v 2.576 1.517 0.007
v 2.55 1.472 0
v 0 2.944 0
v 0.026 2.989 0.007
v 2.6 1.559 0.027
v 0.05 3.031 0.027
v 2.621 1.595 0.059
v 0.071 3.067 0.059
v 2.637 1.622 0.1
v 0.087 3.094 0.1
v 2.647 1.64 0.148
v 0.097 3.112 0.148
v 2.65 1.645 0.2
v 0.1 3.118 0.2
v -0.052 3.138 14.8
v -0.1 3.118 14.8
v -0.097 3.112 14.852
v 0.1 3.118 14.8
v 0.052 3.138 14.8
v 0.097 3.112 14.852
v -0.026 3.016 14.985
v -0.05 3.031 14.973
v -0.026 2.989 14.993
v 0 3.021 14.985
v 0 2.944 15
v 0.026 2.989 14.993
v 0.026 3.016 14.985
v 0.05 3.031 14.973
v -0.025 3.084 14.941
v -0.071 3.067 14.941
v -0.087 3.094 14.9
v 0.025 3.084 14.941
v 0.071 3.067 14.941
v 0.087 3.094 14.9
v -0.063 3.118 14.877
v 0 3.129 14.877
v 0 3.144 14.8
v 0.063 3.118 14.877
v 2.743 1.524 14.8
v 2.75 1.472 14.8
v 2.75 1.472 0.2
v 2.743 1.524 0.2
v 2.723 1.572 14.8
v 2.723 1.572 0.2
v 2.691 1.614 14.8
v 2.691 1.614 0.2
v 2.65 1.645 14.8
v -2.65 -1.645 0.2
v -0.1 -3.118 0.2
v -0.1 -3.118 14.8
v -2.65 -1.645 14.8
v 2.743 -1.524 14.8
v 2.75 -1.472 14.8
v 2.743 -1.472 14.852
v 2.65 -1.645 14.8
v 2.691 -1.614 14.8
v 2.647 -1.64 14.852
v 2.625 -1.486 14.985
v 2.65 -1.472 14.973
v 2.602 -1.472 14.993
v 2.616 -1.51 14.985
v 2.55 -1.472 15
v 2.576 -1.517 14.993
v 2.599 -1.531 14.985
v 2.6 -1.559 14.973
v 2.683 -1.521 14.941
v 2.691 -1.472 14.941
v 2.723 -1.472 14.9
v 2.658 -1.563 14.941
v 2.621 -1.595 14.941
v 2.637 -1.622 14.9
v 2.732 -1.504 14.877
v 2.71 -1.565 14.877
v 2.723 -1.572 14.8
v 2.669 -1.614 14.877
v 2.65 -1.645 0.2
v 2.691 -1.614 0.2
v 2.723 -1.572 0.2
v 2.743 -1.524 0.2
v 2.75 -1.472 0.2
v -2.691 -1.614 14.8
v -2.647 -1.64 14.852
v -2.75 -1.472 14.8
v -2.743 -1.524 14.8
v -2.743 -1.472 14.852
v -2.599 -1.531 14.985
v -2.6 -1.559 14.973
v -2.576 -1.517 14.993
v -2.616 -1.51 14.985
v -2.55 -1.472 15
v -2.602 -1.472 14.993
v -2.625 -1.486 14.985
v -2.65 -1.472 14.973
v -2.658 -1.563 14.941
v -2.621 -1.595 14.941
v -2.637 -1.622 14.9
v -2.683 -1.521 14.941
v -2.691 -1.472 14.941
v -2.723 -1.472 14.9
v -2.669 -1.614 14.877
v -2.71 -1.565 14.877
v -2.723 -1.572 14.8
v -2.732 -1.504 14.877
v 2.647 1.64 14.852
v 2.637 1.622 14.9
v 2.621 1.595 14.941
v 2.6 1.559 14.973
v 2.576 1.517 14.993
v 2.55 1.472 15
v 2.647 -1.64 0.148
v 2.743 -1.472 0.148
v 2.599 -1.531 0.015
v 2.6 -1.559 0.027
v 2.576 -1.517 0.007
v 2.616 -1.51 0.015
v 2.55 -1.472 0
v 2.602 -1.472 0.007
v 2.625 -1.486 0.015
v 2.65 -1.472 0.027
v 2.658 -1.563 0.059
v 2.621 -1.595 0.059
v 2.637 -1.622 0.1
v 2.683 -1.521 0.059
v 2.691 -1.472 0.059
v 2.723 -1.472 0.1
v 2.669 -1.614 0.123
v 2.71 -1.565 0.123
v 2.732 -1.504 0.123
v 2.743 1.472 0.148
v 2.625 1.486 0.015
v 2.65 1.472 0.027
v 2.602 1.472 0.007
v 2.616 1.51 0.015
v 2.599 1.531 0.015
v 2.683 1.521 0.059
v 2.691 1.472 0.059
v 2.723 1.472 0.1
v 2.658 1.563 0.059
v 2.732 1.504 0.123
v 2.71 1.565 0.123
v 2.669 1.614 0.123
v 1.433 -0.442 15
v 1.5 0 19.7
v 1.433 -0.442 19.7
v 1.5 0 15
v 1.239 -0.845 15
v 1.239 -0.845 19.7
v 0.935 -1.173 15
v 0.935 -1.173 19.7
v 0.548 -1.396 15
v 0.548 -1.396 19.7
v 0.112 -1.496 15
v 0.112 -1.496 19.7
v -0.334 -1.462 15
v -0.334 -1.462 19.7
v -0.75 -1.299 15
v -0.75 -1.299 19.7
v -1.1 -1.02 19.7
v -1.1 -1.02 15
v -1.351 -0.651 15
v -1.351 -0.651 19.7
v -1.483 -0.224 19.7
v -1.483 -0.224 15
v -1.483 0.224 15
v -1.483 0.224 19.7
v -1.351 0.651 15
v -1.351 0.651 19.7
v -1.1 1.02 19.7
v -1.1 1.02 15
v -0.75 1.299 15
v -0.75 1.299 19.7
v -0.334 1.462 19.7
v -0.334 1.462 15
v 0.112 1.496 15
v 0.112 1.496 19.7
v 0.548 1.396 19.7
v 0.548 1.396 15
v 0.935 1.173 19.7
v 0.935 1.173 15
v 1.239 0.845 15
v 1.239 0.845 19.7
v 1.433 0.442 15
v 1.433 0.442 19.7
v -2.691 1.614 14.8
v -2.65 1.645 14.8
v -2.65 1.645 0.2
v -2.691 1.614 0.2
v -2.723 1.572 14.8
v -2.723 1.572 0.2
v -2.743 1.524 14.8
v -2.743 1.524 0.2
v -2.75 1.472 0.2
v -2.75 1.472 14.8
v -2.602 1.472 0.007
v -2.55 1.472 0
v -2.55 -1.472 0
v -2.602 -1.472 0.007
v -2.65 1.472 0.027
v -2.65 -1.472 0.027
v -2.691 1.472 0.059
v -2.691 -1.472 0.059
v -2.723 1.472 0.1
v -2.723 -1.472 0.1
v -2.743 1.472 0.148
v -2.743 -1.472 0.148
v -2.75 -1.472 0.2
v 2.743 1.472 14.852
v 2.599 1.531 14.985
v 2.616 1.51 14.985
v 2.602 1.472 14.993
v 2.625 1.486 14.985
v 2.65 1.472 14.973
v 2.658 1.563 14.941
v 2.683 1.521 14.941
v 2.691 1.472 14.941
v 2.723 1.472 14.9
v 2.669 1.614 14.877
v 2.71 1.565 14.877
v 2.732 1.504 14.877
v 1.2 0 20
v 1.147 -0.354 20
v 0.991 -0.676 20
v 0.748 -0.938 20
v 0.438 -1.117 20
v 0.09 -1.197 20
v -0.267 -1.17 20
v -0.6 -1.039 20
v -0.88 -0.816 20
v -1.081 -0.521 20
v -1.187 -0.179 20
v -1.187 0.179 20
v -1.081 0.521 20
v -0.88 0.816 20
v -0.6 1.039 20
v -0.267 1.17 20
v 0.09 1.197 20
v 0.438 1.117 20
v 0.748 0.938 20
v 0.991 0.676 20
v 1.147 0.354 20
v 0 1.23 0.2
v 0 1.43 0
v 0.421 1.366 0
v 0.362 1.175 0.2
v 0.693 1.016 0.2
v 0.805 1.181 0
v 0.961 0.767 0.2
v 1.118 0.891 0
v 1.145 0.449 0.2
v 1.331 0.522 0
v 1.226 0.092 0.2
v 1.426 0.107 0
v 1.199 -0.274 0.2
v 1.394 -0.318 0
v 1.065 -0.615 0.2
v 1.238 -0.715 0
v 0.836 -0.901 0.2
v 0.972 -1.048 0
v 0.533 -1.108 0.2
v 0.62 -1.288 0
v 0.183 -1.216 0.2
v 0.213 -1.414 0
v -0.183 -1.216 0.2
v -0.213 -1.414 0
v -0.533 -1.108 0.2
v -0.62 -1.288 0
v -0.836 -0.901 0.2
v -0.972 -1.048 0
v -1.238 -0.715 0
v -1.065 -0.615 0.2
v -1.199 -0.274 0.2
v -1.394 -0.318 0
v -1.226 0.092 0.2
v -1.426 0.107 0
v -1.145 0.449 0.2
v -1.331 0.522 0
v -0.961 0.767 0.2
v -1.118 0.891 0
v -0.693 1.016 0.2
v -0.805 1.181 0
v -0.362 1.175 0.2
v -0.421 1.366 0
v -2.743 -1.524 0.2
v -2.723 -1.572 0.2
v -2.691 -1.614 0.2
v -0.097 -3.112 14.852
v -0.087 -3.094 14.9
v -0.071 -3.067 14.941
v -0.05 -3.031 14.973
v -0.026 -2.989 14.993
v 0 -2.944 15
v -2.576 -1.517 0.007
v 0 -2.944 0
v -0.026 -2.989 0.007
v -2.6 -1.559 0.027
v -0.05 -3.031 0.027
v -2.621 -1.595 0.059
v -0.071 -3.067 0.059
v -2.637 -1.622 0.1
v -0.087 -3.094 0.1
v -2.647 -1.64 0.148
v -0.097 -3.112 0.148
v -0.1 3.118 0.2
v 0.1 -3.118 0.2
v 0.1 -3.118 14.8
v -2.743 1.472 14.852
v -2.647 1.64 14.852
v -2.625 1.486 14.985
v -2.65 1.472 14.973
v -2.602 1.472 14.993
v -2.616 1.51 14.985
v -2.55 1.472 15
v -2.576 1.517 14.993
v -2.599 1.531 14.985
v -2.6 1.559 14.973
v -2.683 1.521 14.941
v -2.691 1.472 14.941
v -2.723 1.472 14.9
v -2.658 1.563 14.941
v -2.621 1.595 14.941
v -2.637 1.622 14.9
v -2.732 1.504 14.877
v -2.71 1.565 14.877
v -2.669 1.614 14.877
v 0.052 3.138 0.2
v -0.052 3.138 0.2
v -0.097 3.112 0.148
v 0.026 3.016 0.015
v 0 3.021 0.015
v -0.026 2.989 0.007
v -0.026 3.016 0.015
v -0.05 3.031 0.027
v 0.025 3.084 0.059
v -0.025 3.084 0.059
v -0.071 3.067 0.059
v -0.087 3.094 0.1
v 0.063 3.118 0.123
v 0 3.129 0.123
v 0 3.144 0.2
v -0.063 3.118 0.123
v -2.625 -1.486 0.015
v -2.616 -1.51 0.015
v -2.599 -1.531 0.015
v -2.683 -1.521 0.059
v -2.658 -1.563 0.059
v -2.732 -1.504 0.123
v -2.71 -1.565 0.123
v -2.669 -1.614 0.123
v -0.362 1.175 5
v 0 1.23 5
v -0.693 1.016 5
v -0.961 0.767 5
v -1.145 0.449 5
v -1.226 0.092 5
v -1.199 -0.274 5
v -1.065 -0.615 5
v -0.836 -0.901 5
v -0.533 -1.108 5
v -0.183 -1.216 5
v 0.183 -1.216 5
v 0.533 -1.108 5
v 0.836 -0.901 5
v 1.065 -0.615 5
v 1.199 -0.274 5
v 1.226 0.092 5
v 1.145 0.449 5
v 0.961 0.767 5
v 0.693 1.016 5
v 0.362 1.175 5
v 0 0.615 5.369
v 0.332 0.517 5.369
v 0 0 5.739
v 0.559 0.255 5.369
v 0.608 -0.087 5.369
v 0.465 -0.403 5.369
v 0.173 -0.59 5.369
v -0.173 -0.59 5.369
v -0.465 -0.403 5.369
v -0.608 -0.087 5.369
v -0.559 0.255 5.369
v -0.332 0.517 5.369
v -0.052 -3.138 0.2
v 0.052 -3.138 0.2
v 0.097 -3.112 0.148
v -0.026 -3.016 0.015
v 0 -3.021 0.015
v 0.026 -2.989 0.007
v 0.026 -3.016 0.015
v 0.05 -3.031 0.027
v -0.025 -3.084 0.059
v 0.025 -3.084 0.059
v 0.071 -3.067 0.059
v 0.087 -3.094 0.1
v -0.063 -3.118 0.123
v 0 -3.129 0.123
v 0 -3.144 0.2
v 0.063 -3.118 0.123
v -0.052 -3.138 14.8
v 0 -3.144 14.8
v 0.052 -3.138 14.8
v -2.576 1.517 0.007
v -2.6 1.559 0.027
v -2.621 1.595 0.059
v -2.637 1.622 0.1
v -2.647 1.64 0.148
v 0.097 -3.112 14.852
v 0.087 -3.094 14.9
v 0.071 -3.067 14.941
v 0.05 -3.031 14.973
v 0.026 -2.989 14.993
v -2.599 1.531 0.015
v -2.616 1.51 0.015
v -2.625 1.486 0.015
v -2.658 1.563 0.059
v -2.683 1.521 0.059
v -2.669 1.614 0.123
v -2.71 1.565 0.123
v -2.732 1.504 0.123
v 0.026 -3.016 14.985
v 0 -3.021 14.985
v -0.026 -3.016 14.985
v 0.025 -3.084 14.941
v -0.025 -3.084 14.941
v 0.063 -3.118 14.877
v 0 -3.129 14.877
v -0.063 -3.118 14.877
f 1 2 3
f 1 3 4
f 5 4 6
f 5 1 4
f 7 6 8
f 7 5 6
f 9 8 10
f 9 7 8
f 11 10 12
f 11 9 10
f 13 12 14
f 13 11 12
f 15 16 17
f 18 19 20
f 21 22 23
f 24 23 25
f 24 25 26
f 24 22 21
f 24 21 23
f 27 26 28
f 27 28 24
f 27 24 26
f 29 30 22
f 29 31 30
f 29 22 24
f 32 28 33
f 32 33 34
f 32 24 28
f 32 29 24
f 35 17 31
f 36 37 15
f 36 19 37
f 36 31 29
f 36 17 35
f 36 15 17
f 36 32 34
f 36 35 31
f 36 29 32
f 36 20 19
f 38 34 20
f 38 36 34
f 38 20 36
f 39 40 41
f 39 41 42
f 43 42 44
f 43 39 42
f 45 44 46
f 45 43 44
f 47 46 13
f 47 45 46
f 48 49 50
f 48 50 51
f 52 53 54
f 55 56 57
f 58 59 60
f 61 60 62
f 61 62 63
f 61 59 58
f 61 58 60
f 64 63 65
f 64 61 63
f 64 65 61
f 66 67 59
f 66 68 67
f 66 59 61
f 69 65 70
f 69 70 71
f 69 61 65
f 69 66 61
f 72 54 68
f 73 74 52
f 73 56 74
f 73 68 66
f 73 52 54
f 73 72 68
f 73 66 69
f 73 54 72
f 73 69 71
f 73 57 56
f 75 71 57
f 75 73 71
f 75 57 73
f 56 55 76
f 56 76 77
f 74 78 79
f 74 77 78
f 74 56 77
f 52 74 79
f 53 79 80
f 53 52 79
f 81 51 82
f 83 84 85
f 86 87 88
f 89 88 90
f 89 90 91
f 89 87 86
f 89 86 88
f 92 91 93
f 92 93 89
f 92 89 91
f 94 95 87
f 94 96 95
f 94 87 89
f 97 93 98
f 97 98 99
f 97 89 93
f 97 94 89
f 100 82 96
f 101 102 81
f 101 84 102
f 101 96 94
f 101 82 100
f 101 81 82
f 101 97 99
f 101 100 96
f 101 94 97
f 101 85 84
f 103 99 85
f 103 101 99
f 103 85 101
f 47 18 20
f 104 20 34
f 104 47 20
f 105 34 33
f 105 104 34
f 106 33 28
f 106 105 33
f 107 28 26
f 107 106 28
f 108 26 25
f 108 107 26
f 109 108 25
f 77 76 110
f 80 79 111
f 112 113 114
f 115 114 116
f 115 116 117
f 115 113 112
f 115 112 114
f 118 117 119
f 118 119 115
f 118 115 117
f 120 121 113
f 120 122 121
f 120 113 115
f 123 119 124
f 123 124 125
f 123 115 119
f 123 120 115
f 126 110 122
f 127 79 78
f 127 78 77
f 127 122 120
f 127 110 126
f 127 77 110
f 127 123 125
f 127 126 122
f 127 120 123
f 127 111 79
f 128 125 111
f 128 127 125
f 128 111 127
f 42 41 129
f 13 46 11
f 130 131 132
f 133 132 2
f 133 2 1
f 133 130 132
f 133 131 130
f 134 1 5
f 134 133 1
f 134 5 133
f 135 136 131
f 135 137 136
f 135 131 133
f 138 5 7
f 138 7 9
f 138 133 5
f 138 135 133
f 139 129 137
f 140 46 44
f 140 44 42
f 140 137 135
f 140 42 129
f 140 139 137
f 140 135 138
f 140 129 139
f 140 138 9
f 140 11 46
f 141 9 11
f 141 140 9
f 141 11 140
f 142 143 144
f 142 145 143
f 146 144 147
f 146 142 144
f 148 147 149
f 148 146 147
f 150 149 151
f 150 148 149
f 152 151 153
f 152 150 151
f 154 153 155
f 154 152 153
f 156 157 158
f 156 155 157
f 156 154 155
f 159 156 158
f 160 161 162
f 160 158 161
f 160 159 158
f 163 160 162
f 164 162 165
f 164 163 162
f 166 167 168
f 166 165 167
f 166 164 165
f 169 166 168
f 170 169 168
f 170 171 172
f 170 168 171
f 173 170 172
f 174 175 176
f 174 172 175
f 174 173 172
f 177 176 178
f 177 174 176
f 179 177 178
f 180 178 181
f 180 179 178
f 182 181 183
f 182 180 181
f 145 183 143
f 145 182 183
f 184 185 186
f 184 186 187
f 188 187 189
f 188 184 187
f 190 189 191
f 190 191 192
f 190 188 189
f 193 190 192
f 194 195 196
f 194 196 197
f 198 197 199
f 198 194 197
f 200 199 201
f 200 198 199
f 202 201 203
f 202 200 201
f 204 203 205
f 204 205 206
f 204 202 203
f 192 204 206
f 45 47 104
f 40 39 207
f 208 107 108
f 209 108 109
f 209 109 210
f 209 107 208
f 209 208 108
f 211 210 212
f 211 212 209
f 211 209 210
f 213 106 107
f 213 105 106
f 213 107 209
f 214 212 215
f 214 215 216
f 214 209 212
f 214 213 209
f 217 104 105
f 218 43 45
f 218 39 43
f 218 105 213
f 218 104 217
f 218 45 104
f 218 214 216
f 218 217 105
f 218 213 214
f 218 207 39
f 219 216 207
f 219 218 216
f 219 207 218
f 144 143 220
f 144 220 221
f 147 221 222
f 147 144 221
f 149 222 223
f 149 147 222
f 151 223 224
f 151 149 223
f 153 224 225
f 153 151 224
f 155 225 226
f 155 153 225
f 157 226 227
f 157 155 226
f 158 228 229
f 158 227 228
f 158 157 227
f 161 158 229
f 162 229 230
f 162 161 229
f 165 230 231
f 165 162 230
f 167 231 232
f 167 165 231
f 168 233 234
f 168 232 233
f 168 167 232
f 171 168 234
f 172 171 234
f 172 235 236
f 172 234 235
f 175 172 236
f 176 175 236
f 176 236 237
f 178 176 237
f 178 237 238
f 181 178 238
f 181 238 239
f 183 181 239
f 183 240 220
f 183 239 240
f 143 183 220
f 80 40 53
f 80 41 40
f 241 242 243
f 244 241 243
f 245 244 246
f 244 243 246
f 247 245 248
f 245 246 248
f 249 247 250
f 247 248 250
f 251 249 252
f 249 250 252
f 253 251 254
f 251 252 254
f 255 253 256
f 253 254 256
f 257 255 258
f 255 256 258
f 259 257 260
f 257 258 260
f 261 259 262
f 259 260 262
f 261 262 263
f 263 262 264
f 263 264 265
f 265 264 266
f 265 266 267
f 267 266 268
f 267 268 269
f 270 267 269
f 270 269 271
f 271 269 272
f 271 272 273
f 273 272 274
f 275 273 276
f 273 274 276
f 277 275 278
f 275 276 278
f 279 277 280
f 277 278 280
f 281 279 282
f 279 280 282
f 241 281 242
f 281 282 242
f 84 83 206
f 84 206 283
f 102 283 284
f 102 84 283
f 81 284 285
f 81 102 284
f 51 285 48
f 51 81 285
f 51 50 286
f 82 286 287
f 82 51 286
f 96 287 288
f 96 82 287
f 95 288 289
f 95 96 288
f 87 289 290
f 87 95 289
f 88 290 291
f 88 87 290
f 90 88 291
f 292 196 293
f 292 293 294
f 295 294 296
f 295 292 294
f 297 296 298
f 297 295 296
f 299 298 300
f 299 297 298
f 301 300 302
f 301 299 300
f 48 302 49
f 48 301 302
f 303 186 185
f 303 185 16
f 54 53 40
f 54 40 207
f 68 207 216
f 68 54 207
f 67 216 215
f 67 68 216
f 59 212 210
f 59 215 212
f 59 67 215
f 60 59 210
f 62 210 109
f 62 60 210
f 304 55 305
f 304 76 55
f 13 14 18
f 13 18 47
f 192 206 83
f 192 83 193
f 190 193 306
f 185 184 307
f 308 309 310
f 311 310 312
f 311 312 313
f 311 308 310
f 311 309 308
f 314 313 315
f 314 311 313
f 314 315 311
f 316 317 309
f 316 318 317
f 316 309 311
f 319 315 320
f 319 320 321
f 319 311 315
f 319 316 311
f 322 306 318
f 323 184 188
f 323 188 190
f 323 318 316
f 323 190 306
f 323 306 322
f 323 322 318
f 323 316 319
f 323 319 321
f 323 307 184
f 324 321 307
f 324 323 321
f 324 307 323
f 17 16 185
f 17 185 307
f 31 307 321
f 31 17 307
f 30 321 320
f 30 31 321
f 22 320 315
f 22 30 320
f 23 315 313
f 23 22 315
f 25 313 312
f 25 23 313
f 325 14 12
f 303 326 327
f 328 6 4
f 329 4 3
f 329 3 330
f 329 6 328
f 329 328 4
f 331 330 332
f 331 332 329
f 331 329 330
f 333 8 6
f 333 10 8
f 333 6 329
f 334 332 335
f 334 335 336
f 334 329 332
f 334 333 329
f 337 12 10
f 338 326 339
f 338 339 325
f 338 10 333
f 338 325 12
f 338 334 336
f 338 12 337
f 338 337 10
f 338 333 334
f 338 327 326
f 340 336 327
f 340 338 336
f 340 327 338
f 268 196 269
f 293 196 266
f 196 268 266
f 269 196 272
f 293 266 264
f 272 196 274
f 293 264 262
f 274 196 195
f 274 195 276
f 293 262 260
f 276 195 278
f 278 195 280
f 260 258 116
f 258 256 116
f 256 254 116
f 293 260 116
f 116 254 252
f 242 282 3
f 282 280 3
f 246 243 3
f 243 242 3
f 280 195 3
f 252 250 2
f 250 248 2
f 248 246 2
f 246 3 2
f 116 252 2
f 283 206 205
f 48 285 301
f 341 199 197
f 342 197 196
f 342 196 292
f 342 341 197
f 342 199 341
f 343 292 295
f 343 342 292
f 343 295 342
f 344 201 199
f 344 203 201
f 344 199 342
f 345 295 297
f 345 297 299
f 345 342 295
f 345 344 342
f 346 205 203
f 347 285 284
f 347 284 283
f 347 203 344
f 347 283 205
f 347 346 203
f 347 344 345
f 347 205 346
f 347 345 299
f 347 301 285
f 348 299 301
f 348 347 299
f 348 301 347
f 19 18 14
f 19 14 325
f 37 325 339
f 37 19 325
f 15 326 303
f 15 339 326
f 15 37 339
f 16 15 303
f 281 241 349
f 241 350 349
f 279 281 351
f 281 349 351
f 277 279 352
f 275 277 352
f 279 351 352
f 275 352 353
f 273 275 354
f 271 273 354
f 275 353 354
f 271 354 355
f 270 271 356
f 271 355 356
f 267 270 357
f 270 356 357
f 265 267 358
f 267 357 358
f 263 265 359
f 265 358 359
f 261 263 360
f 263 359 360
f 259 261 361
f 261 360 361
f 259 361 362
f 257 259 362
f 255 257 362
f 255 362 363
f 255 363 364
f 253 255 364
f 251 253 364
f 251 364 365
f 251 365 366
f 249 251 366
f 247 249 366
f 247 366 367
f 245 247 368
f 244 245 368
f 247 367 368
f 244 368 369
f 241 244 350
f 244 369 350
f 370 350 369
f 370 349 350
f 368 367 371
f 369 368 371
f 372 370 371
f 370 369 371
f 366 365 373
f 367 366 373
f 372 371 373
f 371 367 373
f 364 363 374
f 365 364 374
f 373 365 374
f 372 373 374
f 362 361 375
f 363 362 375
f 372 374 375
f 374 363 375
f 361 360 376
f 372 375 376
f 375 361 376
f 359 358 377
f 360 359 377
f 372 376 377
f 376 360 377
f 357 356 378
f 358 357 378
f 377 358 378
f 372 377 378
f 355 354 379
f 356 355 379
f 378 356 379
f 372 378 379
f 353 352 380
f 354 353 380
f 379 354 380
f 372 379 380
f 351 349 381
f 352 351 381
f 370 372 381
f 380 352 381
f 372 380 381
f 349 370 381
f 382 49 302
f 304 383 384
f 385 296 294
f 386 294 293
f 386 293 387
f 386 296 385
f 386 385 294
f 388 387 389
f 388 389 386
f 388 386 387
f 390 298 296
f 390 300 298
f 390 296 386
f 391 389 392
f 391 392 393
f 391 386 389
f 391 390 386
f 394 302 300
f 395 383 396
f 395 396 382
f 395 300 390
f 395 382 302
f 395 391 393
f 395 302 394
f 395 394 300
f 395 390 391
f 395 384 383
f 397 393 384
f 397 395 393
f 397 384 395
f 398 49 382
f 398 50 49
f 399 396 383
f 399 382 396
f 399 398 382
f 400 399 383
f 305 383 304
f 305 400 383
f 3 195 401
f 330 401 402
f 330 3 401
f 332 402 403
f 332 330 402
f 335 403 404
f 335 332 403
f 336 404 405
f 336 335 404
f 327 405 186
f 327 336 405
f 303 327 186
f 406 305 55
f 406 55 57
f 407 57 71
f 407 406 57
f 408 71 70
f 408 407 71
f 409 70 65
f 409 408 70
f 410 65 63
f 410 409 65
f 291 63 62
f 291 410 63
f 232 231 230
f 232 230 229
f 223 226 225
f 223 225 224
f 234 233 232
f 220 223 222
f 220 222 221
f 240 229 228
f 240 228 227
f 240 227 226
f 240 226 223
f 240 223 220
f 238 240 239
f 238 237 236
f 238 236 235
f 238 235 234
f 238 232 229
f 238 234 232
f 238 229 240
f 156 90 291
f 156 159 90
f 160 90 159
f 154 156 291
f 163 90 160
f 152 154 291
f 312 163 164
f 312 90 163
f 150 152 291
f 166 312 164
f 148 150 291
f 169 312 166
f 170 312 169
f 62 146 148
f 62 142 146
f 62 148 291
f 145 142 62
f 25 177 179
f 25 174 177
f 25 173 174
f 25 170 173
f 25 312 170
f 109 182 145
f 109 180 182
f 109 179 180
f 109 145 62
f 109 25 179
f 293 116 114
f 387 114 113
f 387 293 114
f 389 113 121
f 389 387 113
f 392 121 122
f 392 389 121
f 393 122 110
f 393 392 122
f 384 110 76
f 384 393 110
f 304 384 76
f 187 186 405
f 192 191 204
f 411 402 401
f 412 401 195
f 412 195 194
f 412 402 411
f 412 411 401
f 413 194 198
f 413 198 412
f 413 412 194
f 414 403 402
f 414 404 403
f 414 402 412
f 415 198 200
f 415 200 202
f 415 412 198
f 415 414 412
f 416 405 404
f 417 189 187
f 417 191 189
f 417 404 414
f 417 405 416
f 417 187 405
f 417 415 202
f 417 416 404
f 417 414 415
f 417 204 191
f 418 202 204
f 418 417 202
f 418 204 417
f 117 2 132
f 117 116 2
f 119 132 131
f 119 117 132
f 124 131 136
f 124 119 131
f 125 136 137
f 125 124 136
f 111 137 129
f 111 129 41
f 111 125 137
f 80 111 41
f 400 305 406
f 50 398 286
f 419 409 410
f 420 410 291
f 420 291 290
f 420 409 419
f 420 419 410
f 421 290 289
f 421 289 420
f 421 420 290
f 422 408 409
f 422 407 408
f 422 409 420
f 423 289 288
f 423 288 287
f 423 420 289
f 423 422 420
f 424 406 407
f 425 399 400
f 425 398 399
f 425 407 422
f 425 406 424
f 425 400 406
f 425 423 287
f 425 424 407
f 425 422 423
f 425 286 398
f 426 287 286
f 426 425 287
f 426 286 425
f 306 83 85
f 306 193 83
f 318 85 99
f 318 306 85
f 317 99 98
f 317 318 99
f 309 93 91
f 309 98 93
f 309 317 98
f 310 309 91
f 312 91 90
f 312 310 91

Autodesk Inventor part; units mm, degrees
ref_plane "YZ Plane" through (0, 0, 0) normal (1, 0, 0) x (0, 1, 0)
ref_plane "XZ Plane" through (0, 0, 0) normal (0, 1, 0) x (-1, 0, 0)
ref_plane "XY Plane" through (0, 0, 0) normal (0, 0, 1) x (1, 0, 0)
sketch "スケッチ1" plane through (0, 0, 0) normal (0, 0, 1) x (1, 0, 0)
  line L0 (0, 3.1754) -> (2.75, 1.5877)
  line L1 (2.75, 1.5877) -> (2.75, -1.5877)
  line L2 (2.75, -1.5877) -> (0, -3.1754)
  line L3 (0, -3.1754) -> (-2.75, -1.5877)
  line L4 (-2.75, -1.5877) -> (-2.75, 1.5877)
  line L5 (-2.75, 1.5877) -> (0, 3.1754)
  point P0 (0, 0)
  point P1 (0, 0)
  dimension "d0" = 5.5
extrude "押し出し1" add sketch "スケッチ1" along normal blind 15
sketch "スケッチ2" plane through (0, 0, 15) normal (0, 0, 1) x (1, 0, 0)
  circle A0 centre (0, 0) radius 1.5
  dimension "d3" = 3
extrude "押し出し2" add sketch "スケッチ2" along normal blind 5
thread "ねじ1" size "M3x0.5" class "6g" standard "ANSI Metric M Profile" length 12
chamfer "面取り1" distance 0.3 angle 45 1 edges at (-1.5, 0, 20)
fillet "フィレット1" radius 0.2 18 edges at (-1.375, 2.3816, 15) (1.375, 2.3816, 15) (2.75, 0, 15) (1.375, -2.3816, 15) (-1.375, -2.3816, 15) (-2.75, 0, 15) (-2.75, -1.5877, 7.5) (0, -3.1754, 7.5) (2.75, -1.5877, 7.5) (2.75, 1.5877, 7.5) (0, 3.1754, 7.5) (-2.75, 1.5877, 7.5) (-1.375, 2.3816, 0) (1.375, 2.3816, 0) (2.75, 0, 0) (1.375, -2.3816, 0) (-1.375, -2.3816, 0) (-2.75, 0, 0)
sketch "スケッチ3" plane through (0, 0, 0) normal (0, 0, -1) x (-1, 0, 0)
  point P0 (0, 0)
hole "穴1" at (0, 0, 0) direction (0, 0, 1) diameter 2.459 depth 5 tip angle 118 thread size "M3x0.5" class "6H" standard "ANSI Metric M Profile"
chamfer "面取り2" distance 0.2 angle 45 1 edges at (0, -1.2295, 0)
properties part number "hexagonal_spacer_M3_15mm" material "鋼、炭素鋼"
